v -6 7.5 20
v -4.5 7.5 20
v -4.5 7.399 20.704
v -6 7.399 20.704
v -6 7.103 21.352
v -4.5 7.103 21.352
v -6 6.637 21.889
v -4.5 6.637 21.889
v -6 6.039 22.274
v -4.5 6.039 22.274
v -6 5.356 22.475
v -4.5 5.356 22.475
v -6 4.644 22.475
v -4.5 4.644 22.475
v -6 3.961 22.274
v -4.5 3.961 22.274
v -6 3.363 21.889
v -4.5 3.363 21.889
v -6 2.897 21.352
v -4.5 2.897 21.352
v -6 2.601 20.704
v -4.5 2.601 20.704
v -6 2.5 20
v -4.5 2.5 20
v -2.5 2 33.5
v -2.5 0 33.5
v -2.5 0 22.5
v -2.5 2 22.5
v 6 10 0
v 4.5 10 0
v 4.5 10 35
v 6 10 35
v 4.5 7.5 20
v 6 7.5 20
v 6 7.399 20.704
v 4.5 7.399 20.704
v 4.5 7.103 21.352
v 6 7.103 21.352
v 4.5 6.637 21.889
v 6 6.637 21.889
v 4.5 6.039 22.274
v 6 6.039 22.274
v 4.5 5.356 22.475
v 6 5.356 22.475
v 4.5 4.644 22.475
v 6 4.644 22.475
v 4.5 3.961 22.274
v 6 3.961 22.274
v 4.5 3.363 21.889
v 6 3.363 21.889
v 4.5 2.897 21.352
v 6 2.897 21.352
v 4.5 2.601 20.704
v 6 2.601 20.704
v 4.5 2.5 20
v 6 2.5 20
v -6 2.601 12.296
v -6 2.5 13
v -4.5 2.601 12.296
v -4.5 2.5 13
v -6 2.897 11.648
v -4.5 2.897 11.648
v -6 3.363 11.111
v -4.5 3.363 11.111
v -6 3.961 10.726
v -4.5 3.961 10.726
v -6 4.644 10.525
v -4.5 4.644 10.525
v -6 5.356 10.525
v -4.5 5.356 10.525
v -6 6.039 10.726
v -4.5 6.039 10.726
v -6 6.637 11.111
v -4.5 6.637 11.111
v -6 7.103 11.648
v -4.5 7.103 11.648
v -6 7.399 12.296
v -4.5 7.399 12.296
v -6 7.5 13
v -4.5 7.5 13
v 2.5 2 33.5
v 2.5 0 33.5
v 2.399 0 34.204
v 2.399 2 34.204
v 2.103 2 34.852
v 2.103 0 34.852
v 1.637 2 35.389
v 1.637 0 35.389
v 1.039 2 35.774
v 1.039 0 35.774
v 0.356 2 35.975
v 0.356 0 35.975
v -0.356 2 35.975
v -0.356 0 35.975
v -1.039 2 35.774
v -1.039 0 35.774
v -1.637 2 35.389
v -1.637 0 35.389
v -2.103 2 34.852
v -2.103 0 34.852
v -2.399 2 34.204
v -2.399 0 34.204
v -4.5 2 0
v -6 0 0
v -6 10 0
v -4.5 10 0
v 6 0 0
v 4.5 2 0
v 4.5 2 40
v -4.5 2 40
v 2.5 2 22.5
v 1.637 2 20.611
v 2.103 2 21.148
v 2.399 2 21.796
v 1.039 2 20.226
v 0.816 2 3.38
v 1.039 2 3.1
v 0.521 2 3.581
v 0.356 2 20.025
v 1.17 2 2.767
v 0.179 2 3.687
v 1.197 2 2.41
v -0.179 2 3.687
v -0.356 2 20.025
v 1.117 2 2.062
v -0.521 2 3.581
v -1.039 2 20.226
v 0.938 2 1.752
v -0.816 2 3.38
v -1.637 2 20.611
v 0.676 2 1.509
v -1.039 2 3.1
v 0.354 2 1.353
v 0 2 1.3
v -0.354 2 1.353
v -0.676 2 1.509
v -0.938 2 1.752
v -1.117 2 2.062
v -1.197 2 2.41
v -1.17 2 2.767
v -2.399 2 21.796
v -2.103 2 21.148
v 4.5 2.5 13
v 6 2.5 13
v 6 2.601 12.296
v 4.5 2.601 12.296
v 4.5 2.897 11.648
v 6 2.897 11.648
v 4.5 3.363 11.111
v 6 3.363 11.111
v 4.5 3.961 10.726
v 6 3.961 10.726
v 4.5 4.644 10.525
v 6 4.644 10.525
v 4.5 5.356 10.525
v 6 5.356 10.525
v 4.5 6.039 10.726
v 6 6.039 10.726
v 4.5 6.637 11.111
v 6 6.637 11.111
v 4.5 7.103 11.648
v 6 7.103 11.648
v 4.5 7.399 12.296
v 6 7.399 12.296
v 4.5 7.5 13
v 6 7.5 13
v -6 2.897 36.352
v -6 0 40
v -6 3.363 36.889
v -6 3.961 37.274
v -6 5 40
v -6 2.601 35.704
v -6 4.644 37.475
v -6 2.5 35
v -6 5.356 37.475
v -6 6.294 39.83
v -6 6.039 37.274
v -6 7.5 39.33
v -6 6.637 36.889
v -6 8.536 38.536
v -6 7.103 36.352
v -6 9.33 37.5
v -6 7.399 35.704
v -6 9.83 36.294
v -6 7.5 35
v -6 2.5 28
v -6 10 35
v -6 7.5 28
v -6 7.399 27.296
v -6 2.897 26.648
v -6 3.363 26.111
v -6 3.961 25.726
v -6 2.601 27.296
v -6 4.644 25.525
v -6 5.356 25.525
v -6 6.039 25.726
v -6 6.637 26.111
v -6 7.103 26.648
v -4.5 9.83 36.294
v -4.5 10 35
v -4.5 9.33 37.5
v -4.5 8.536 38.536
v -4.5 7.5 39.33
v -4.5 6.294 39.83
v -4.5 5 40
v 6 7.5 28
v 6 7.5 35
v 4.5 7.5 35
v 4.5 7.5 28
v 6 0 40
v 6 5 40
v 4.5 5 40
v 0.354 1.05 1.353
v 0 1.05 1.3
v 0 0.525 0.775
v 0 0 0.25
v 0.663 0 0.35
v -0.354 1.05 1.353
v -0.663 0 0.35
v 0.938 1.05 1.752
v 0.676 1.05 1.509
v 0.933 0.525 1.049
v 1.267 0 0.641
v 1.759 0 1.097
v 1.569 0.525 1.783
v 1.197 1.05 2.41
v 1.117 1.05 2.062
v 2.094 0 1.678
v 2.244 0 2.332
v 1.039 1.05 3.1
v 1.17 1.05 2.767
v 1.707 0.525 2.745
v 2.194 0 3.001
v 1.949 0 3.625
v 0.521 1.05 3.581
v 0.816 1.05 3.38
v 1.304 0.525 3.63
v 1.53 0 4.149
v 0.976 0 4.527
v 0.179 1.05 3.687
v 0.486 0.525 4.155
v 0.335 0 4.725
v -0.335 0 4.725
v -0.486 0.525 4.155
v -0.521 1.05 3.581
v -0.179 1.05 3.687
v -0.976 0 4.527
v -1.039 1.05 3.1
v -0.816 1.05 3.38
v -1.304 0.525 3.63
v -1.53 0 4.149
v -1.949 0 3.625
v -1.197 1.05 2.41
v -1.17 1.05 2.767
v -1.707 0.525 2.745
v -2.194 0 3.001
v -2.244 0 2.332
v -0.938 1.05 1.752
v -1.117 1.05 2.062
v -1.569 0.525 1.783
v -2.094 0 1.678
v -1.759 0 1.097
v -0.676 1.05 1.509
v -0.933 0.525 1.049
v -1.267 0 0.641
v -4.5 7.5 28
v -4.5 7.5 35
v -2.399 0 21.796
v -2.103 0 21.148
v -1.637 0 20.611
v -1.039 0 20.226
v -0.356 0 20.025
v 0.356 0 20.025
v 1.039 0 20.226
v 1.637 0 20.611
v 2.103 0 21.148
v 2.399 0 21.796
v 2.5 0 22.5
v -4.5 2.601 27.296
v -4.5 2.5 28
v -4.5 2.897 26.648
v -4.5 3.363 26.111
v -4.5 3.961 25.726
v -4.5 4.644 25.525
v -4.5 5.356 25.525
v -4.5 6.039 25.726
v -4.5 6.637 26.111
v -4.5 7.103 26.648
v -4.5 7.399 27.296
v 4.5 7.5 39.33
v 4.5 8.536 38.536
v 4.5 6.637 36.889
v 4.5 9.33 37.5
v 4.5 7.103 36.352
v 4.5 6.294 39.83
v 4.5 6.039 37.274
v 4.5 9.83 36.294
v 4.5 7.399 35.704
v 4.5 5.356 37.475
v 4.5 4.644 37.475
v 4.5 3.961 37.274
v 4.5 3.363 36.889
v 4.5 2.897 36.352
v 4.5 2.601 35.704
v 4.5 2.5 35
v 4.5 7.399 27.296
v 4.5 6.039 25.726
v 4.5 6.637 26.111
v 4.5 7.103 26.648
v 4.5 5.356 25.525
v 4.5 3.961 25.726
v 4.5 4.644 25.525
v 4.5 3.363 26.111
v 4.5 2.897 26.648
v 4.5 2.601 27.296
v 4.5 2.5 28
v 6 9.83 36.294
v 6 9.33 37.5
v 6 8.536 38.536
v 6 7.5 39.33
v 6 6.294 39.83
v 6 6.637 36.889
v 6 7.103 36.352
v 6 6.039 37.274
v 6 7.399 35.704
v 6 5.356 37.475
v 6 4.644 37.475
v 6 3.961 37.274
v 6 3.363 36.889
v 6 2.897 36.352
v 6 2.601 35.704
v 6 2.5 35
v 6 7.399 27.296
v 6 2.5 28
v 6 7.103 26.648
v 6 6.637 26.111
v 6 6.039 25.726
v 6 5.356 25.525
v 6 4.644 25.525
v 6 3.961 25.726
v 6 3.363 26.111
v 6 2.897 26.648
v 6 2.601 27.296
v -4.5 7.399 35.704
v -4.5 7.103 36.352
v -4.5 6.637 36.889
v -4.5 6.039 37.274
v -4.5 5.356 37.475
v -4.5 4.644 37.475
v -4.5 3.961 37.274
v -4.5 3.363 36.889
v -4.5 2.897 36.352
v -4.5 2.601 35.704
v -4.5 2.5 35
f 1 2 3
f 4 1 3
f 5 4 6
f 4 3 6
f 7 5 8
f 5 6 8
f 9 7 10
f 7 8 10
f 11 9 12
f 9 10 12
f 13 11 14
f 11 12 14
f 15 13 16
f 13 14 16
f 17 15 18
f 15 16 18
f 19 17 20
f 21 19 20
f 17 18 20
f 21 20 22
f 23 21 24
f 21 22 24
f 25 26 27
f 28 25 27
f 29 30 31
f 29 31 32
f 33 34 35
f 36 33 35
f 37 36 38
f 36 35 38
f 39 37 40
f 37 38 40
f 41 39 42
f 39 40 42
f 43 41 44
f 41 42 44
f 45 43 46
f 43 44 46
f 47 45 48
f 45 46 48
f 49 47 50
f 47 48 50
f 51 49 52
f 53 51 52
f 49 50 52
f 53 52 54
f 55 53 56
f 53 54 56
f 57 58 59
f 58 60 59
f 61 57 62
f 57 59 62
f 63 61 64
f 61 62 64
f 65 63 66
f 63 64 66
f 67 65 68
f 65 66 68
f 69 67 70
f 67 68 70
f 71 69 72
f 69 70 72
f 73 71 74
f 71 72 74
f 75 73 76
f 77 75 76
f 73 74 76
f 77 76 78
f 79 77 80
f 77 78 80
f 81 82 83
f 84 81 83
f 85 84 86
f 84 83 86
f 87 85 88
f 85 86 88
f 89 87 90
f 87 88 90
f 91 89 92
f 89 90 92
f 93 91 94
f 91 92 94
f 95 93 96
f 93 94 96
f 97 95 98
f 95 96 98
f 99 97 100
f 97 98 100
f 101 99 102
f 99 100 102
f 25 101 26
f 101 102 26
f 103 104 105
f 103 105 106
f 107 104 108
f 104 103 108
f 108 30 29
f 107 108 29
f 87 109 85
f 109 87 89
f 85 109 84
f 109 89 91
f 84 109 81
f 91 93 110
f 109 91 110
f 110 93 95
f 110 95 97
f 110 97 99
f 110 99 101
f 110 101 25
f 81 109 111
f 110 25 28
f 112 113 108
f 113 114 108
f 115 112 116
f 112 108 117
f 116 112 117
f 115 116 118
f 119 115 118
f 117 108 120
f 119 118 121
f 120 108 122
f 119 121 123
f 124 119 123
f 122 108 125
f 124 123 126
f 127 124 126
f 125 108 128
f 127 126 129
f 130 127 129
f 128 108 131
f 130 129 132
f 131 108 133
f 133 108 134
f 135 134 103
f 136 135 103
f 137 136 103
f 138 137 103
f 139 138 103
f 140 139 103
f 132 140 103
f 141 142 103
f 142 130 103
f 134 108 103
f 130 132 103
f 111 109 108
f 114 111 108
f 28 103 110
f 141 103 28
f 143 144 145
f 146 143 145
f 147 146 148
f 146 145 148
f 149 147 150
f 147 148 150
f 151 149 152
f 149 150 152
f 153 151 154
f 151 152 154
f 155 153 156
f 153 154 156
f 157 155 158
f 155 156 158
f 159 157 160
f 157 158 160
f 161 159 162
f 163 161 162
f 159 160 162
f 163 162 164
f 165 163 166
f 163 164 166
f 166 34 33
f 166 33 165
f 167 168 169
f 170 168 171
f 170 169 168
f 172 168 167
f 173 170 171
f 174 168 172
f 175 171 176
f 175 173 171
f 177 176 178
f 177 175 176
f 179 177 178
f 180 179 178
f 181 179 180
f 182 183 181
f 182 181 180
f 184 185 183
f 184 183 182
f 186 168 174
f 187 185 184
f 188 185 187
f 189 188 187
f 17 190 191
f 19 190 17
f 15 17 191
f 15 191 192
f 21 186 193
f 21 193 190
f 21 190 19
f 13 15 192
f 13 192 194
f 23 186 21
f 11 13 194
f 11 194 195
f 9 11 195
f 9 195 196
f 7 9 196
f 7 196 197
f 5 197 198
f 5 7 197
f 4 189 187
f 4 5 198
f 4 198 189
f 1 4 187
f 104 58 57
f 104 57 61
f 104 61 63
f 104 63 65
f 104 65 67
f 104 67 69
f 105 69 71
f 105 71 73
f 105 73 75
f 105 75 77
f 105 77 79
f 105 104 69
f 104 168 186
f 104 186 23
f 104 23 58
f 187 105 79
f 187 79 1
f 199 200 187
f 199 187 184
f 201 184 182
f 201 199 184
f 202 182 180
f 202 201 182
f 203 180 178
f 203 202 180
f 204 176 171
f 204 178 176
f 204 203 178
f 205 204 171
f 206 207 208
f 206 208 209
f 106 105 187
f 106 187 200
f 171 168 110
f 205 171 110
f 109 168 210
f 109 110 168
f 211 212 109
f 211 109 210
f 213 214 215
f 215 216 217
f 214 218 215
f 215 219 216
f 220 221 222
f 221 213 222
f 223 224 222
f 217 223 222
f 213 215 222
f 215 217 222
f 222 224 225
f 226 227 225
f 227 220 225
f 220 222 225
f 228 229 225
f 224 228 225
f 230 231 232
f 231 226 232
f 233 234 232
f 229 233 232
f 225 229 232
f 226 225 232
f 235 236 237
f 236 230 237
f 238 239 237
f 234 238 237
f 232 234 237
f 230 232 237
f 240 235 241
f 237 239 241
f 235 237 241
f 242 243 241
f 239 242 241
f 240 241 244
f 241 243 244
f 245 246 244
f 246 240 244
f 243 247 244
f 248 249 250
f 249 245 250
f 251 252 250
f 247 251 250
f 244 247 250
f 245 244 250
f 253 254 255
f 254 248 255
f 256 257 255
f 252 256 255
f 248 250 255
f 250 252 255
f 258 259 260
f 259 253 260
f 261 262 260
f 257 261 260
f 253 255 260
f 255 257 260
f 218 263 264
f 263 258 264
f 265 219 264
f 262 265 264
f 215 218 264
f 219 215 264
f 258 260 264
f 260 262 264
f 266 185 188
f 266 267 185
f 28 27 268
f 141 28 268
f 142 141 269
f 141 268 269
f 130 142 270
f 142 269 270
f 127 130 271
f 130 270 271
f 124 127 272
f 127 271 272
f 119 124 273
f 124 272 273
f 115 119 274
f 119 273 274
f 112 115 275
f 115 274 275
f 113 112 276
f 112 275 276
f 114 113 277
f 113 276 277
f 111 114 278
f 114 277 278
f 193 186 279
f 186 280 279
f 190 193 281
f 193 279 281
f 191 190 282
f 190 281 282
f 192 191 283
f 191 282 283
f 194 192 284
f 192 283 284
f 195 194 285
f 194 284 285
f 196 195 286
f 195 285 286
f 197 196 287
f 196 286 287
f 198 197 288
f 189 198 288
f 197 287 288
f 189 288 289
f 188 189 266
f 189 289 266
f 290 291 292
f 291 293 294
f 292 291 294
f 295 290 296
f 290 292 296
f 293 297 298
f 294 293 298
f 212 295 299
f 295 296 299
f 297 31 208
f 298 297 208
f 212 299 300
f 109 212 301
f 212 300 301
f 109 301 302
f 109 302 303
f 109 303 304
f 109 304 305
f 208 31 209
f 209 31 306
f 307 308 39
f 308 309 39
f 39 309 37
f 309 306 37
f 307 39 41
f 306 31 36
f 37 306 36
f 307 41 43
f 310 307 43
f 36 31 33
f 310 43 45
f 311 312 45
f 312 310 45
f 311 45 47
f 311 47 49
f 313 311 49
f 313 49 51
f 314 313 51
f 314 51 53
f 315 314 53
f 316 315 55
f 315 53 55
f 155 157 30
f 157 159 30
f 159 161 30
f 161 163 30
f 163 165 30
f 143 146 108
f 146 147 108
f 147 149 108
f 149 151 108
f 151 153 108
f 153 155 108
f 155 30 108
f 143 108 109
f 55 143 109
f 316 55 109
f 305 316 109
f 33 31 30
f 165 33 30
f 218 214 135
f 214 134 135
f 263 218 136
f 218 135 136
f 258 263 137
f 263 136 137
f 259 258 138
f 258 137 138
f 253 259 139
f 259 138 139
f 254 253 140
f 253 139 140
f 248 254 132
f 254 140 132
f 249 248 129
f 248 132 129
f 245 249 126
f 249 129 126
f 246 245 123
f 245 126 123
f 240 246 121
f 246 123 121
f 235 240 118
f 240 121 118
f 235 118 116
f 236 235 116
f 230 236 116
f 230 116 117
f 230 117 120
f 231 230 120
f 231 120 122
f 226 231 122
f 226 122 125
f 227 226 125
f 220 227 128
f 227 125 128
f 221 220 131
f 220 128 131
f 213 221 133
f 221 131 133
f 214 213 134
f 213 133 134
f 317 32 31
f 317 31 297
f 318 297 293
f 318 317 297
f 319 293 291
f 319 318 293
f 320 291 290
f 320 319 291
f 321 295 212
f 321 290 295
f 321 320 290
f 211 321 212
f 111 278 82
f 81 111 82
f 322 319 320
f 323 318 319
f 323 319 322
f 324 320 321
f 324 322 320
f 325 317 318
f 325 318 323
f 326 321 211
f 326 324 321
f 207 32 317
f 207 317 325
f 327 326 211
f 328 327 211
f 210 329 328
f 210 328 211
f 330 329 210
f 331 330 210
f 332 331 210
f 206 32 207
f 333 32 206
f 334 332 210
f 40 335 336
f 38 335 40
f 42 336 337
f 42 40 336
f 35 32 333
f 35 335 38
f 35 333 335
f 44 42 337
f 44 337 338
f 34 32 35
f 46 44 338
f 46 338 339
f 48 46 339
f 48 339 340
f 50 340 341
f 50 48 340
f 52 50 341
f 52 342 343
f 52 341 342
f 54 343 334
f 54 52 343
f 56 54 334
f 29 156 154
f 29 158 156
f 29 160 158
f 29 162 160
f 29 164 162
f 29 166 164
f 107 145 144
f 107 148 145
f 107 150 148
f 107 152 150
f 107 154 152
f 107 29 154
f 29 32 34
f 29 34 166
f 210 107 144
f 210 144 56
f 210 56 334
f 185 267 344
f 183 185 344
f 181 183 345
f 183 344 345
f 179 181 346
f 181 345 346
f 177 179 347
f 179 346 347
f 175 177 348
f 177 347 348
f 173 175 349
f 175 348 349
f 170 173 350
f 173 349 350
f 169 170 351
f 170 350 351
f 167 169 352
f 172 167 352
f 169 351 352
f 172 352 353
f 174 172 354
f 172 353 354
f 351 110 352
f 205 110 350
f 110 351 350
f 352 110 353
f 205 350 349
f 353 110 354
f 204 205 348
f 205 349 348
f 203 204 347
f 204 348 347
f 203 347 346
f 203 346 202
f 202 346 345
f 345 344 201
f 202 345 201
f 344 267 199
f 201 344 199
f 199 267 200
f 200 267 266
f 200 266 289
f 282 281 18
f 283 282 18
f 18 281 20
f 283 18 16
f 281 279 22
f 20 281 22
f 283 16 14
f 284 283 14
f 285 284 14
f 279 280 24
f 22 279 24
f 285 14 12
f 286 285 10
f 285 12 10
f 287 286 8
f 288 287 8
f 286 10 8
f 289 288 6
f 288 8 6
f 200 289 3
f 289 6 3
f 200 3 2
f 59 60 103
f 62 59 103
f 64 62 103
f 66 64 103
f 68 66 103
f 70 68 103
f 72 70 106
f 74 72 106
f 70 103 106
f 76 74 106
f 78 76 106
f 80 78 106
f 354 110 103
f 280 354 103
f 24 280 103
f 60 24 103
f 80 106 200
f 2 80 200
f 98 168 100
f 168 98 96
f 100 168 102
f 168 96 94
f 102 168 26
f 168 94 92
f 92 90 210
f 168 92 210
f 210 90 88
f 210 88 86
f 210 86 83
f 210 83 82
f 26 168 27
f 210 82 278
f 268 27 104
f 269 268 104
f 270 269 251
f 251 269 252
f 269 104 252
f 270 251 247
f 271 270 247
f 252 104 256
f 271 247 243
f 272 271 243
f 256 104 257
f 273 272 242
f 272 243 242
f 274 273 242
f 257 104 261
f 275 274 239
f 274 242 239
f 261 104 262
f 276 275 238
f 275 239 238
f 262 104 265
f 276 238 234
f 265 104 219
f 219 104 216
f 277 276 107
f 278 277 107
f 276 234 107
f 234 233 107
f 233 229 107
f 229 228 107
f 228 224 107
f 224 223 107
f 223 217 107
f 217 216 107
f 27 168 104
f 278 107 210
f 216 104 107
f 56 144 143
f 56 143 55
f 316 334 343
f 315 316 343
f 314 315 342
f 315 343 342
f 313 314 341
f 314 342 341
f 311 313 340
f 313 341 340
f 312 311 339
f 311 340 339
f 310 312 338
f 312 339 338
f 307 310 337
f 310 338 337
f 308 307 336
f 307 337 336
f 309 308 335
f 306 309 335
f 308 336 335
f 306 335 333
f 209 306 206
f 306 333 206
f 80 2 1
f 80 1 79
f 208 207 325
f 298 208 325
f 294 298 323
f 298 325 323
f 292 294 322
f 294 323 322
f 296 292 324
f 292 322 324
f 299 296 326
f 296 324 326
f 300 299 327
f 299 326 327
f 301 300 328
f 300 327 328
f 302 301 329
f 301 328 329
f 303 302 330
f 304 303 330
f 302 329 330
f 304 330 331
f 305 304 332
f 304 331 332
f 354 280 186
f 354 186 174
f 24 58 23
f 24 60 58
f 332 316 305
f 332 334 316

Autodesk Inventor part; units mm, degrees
ref_plane "YZ Plane" through (0, 0, 0) normal (1, 0, 0) x (0, 1, 0)
ref_plane "XZ Plane" through (0, 0, 0) normal (0, 1, 0) x (-1, 0, 0)
ref_plane "XY Plane" through (0, 0, 0) normal (0, 0, 1) x (1, 0, 0)
sketch "Skizze1" plane through (0, 0, 0) normal (0, 0, 1) x (1, 0, 0)
  line L0 (-8.4, 0) -> (8.4, 0) projected
  line L1 (0, -2) -> (0, 12) projected
  line L2 (6, 10) -> (6, 0)
  line L3 (6, 0) -> (-6, 0)
  line L4 (-6, 0) -> (-6, 10)
  line L5 (4.5, 10) -> (4.5, 2)
  line L6 (4.5, 2) -> (-4.5, 2)
  line L7 (-4.5, 2) -> (-4.5, 10)
  line L8 (-6, 10) -> (-4.5, 10)
  line L9 (4.5, 10) -> (6, 10)
  point P0 (0, 0)
  dimension "d0" = 2
  dimension "d2" = 9
  dimension "d3" = 1.5
  dimension "d4" = 10
extrude "Extrusion1" add sketch "Skizze1" along normal blind 40
sketch "Skizze2" plane through (-6, 0, 0) normal (0, -1, 0) x (1, 0, 0)
  line L0 (0, 0) -> (12, 0) projected
  line L1 (12, 0) -> (12, 40) projected
  point P0 (6, 0)
  point P1 (6, 2.5)
  dimension "d7" = 2.5
  dimension "d8" = 6
hole "Bohrung1" at (0, 0, 2.5) direction (0, 1, 0) diameter 2.4 end through all countersink diameter 4.5 countersink angle 90
sketch "Skizze3" plane through (-6, 0, 0) normal (0, -1, 0) x (1, 0, 0)
  line L0 (0, 40) -> (12, 40) projected
  line L1 (0, 0) -> (0, 40) projected
  line L2 (3.5, 33.5) -> (3.5, 22.5)
  line L3 (8.5, 22.5) -> (8.5, 33.5)
  arc A0 (8.5, 33.5) -> (3.5, 33.5) centre (6, 33.5) ccw
  arc A1 (3.5, 22.5) -> (8.5, 22.5) centre (6, 22.5) ccw
  line L4 (0, 0) -> (12, 0) projected
  line L5 (6, 22.5) -> (6, 33.5)
  point P0 (6, 0)
  point P1 (6, 28)
  dimension "d36" = 4
  dimension "d37" = 20
  dimension "d38" = 6
  dimension "d39" = 5
extrude "Extrusion2" cut sketch "Skizze3" against normal through all
sketch "Skizze4" plane through (6, 0, 0) normal (1, 0, 0) x (0, 0, -1)
  line L0 (0, 10) -> (-40, 10) projected
  line L1 (-40, 0) -> (-40, 10) projected
  line L2 (0, 0) -> (-40, 0) projected
  line L3 (-35, 5) -> (-28, 5) construction
  line L4 (-35, 7.5) -> (-28, 7.5)
  line L5 (-28, 2.5) -> (-35, 2.5)
  arc A0 (-35, 7.5) -> (-35, 2.5) centre (-35, 5) ccw
  arc A1 (-28, 2.5) -> (-28, 7.5) centre (-28, 5) ccw
  circle A2 centre (-35, 5) radius 5
  point P0 (-31.5, 5)
  dimension "d25" = 5
  dimension "d26" = 7
  dimension "d27" = 5
  dimension "d28" = 5
  dimension "d35" = 7
extrude "Extrusion3" cut sketch "Skizze4" against normal through all contours A2 L5 A0 L4 | L4 A1 L5 A2 picked at (-33.3333, 5)
pattern_linear "Rechteckige Anordnung1" count 2 spacing 15 along (0, 0, -1) of "Extrusion3"
fillet "Rundung1" radius 5 2 edges at (-5.25, 10, 40) (5.25, 10, 40)
properties part number "13_1087_002" material "Kupfer"
